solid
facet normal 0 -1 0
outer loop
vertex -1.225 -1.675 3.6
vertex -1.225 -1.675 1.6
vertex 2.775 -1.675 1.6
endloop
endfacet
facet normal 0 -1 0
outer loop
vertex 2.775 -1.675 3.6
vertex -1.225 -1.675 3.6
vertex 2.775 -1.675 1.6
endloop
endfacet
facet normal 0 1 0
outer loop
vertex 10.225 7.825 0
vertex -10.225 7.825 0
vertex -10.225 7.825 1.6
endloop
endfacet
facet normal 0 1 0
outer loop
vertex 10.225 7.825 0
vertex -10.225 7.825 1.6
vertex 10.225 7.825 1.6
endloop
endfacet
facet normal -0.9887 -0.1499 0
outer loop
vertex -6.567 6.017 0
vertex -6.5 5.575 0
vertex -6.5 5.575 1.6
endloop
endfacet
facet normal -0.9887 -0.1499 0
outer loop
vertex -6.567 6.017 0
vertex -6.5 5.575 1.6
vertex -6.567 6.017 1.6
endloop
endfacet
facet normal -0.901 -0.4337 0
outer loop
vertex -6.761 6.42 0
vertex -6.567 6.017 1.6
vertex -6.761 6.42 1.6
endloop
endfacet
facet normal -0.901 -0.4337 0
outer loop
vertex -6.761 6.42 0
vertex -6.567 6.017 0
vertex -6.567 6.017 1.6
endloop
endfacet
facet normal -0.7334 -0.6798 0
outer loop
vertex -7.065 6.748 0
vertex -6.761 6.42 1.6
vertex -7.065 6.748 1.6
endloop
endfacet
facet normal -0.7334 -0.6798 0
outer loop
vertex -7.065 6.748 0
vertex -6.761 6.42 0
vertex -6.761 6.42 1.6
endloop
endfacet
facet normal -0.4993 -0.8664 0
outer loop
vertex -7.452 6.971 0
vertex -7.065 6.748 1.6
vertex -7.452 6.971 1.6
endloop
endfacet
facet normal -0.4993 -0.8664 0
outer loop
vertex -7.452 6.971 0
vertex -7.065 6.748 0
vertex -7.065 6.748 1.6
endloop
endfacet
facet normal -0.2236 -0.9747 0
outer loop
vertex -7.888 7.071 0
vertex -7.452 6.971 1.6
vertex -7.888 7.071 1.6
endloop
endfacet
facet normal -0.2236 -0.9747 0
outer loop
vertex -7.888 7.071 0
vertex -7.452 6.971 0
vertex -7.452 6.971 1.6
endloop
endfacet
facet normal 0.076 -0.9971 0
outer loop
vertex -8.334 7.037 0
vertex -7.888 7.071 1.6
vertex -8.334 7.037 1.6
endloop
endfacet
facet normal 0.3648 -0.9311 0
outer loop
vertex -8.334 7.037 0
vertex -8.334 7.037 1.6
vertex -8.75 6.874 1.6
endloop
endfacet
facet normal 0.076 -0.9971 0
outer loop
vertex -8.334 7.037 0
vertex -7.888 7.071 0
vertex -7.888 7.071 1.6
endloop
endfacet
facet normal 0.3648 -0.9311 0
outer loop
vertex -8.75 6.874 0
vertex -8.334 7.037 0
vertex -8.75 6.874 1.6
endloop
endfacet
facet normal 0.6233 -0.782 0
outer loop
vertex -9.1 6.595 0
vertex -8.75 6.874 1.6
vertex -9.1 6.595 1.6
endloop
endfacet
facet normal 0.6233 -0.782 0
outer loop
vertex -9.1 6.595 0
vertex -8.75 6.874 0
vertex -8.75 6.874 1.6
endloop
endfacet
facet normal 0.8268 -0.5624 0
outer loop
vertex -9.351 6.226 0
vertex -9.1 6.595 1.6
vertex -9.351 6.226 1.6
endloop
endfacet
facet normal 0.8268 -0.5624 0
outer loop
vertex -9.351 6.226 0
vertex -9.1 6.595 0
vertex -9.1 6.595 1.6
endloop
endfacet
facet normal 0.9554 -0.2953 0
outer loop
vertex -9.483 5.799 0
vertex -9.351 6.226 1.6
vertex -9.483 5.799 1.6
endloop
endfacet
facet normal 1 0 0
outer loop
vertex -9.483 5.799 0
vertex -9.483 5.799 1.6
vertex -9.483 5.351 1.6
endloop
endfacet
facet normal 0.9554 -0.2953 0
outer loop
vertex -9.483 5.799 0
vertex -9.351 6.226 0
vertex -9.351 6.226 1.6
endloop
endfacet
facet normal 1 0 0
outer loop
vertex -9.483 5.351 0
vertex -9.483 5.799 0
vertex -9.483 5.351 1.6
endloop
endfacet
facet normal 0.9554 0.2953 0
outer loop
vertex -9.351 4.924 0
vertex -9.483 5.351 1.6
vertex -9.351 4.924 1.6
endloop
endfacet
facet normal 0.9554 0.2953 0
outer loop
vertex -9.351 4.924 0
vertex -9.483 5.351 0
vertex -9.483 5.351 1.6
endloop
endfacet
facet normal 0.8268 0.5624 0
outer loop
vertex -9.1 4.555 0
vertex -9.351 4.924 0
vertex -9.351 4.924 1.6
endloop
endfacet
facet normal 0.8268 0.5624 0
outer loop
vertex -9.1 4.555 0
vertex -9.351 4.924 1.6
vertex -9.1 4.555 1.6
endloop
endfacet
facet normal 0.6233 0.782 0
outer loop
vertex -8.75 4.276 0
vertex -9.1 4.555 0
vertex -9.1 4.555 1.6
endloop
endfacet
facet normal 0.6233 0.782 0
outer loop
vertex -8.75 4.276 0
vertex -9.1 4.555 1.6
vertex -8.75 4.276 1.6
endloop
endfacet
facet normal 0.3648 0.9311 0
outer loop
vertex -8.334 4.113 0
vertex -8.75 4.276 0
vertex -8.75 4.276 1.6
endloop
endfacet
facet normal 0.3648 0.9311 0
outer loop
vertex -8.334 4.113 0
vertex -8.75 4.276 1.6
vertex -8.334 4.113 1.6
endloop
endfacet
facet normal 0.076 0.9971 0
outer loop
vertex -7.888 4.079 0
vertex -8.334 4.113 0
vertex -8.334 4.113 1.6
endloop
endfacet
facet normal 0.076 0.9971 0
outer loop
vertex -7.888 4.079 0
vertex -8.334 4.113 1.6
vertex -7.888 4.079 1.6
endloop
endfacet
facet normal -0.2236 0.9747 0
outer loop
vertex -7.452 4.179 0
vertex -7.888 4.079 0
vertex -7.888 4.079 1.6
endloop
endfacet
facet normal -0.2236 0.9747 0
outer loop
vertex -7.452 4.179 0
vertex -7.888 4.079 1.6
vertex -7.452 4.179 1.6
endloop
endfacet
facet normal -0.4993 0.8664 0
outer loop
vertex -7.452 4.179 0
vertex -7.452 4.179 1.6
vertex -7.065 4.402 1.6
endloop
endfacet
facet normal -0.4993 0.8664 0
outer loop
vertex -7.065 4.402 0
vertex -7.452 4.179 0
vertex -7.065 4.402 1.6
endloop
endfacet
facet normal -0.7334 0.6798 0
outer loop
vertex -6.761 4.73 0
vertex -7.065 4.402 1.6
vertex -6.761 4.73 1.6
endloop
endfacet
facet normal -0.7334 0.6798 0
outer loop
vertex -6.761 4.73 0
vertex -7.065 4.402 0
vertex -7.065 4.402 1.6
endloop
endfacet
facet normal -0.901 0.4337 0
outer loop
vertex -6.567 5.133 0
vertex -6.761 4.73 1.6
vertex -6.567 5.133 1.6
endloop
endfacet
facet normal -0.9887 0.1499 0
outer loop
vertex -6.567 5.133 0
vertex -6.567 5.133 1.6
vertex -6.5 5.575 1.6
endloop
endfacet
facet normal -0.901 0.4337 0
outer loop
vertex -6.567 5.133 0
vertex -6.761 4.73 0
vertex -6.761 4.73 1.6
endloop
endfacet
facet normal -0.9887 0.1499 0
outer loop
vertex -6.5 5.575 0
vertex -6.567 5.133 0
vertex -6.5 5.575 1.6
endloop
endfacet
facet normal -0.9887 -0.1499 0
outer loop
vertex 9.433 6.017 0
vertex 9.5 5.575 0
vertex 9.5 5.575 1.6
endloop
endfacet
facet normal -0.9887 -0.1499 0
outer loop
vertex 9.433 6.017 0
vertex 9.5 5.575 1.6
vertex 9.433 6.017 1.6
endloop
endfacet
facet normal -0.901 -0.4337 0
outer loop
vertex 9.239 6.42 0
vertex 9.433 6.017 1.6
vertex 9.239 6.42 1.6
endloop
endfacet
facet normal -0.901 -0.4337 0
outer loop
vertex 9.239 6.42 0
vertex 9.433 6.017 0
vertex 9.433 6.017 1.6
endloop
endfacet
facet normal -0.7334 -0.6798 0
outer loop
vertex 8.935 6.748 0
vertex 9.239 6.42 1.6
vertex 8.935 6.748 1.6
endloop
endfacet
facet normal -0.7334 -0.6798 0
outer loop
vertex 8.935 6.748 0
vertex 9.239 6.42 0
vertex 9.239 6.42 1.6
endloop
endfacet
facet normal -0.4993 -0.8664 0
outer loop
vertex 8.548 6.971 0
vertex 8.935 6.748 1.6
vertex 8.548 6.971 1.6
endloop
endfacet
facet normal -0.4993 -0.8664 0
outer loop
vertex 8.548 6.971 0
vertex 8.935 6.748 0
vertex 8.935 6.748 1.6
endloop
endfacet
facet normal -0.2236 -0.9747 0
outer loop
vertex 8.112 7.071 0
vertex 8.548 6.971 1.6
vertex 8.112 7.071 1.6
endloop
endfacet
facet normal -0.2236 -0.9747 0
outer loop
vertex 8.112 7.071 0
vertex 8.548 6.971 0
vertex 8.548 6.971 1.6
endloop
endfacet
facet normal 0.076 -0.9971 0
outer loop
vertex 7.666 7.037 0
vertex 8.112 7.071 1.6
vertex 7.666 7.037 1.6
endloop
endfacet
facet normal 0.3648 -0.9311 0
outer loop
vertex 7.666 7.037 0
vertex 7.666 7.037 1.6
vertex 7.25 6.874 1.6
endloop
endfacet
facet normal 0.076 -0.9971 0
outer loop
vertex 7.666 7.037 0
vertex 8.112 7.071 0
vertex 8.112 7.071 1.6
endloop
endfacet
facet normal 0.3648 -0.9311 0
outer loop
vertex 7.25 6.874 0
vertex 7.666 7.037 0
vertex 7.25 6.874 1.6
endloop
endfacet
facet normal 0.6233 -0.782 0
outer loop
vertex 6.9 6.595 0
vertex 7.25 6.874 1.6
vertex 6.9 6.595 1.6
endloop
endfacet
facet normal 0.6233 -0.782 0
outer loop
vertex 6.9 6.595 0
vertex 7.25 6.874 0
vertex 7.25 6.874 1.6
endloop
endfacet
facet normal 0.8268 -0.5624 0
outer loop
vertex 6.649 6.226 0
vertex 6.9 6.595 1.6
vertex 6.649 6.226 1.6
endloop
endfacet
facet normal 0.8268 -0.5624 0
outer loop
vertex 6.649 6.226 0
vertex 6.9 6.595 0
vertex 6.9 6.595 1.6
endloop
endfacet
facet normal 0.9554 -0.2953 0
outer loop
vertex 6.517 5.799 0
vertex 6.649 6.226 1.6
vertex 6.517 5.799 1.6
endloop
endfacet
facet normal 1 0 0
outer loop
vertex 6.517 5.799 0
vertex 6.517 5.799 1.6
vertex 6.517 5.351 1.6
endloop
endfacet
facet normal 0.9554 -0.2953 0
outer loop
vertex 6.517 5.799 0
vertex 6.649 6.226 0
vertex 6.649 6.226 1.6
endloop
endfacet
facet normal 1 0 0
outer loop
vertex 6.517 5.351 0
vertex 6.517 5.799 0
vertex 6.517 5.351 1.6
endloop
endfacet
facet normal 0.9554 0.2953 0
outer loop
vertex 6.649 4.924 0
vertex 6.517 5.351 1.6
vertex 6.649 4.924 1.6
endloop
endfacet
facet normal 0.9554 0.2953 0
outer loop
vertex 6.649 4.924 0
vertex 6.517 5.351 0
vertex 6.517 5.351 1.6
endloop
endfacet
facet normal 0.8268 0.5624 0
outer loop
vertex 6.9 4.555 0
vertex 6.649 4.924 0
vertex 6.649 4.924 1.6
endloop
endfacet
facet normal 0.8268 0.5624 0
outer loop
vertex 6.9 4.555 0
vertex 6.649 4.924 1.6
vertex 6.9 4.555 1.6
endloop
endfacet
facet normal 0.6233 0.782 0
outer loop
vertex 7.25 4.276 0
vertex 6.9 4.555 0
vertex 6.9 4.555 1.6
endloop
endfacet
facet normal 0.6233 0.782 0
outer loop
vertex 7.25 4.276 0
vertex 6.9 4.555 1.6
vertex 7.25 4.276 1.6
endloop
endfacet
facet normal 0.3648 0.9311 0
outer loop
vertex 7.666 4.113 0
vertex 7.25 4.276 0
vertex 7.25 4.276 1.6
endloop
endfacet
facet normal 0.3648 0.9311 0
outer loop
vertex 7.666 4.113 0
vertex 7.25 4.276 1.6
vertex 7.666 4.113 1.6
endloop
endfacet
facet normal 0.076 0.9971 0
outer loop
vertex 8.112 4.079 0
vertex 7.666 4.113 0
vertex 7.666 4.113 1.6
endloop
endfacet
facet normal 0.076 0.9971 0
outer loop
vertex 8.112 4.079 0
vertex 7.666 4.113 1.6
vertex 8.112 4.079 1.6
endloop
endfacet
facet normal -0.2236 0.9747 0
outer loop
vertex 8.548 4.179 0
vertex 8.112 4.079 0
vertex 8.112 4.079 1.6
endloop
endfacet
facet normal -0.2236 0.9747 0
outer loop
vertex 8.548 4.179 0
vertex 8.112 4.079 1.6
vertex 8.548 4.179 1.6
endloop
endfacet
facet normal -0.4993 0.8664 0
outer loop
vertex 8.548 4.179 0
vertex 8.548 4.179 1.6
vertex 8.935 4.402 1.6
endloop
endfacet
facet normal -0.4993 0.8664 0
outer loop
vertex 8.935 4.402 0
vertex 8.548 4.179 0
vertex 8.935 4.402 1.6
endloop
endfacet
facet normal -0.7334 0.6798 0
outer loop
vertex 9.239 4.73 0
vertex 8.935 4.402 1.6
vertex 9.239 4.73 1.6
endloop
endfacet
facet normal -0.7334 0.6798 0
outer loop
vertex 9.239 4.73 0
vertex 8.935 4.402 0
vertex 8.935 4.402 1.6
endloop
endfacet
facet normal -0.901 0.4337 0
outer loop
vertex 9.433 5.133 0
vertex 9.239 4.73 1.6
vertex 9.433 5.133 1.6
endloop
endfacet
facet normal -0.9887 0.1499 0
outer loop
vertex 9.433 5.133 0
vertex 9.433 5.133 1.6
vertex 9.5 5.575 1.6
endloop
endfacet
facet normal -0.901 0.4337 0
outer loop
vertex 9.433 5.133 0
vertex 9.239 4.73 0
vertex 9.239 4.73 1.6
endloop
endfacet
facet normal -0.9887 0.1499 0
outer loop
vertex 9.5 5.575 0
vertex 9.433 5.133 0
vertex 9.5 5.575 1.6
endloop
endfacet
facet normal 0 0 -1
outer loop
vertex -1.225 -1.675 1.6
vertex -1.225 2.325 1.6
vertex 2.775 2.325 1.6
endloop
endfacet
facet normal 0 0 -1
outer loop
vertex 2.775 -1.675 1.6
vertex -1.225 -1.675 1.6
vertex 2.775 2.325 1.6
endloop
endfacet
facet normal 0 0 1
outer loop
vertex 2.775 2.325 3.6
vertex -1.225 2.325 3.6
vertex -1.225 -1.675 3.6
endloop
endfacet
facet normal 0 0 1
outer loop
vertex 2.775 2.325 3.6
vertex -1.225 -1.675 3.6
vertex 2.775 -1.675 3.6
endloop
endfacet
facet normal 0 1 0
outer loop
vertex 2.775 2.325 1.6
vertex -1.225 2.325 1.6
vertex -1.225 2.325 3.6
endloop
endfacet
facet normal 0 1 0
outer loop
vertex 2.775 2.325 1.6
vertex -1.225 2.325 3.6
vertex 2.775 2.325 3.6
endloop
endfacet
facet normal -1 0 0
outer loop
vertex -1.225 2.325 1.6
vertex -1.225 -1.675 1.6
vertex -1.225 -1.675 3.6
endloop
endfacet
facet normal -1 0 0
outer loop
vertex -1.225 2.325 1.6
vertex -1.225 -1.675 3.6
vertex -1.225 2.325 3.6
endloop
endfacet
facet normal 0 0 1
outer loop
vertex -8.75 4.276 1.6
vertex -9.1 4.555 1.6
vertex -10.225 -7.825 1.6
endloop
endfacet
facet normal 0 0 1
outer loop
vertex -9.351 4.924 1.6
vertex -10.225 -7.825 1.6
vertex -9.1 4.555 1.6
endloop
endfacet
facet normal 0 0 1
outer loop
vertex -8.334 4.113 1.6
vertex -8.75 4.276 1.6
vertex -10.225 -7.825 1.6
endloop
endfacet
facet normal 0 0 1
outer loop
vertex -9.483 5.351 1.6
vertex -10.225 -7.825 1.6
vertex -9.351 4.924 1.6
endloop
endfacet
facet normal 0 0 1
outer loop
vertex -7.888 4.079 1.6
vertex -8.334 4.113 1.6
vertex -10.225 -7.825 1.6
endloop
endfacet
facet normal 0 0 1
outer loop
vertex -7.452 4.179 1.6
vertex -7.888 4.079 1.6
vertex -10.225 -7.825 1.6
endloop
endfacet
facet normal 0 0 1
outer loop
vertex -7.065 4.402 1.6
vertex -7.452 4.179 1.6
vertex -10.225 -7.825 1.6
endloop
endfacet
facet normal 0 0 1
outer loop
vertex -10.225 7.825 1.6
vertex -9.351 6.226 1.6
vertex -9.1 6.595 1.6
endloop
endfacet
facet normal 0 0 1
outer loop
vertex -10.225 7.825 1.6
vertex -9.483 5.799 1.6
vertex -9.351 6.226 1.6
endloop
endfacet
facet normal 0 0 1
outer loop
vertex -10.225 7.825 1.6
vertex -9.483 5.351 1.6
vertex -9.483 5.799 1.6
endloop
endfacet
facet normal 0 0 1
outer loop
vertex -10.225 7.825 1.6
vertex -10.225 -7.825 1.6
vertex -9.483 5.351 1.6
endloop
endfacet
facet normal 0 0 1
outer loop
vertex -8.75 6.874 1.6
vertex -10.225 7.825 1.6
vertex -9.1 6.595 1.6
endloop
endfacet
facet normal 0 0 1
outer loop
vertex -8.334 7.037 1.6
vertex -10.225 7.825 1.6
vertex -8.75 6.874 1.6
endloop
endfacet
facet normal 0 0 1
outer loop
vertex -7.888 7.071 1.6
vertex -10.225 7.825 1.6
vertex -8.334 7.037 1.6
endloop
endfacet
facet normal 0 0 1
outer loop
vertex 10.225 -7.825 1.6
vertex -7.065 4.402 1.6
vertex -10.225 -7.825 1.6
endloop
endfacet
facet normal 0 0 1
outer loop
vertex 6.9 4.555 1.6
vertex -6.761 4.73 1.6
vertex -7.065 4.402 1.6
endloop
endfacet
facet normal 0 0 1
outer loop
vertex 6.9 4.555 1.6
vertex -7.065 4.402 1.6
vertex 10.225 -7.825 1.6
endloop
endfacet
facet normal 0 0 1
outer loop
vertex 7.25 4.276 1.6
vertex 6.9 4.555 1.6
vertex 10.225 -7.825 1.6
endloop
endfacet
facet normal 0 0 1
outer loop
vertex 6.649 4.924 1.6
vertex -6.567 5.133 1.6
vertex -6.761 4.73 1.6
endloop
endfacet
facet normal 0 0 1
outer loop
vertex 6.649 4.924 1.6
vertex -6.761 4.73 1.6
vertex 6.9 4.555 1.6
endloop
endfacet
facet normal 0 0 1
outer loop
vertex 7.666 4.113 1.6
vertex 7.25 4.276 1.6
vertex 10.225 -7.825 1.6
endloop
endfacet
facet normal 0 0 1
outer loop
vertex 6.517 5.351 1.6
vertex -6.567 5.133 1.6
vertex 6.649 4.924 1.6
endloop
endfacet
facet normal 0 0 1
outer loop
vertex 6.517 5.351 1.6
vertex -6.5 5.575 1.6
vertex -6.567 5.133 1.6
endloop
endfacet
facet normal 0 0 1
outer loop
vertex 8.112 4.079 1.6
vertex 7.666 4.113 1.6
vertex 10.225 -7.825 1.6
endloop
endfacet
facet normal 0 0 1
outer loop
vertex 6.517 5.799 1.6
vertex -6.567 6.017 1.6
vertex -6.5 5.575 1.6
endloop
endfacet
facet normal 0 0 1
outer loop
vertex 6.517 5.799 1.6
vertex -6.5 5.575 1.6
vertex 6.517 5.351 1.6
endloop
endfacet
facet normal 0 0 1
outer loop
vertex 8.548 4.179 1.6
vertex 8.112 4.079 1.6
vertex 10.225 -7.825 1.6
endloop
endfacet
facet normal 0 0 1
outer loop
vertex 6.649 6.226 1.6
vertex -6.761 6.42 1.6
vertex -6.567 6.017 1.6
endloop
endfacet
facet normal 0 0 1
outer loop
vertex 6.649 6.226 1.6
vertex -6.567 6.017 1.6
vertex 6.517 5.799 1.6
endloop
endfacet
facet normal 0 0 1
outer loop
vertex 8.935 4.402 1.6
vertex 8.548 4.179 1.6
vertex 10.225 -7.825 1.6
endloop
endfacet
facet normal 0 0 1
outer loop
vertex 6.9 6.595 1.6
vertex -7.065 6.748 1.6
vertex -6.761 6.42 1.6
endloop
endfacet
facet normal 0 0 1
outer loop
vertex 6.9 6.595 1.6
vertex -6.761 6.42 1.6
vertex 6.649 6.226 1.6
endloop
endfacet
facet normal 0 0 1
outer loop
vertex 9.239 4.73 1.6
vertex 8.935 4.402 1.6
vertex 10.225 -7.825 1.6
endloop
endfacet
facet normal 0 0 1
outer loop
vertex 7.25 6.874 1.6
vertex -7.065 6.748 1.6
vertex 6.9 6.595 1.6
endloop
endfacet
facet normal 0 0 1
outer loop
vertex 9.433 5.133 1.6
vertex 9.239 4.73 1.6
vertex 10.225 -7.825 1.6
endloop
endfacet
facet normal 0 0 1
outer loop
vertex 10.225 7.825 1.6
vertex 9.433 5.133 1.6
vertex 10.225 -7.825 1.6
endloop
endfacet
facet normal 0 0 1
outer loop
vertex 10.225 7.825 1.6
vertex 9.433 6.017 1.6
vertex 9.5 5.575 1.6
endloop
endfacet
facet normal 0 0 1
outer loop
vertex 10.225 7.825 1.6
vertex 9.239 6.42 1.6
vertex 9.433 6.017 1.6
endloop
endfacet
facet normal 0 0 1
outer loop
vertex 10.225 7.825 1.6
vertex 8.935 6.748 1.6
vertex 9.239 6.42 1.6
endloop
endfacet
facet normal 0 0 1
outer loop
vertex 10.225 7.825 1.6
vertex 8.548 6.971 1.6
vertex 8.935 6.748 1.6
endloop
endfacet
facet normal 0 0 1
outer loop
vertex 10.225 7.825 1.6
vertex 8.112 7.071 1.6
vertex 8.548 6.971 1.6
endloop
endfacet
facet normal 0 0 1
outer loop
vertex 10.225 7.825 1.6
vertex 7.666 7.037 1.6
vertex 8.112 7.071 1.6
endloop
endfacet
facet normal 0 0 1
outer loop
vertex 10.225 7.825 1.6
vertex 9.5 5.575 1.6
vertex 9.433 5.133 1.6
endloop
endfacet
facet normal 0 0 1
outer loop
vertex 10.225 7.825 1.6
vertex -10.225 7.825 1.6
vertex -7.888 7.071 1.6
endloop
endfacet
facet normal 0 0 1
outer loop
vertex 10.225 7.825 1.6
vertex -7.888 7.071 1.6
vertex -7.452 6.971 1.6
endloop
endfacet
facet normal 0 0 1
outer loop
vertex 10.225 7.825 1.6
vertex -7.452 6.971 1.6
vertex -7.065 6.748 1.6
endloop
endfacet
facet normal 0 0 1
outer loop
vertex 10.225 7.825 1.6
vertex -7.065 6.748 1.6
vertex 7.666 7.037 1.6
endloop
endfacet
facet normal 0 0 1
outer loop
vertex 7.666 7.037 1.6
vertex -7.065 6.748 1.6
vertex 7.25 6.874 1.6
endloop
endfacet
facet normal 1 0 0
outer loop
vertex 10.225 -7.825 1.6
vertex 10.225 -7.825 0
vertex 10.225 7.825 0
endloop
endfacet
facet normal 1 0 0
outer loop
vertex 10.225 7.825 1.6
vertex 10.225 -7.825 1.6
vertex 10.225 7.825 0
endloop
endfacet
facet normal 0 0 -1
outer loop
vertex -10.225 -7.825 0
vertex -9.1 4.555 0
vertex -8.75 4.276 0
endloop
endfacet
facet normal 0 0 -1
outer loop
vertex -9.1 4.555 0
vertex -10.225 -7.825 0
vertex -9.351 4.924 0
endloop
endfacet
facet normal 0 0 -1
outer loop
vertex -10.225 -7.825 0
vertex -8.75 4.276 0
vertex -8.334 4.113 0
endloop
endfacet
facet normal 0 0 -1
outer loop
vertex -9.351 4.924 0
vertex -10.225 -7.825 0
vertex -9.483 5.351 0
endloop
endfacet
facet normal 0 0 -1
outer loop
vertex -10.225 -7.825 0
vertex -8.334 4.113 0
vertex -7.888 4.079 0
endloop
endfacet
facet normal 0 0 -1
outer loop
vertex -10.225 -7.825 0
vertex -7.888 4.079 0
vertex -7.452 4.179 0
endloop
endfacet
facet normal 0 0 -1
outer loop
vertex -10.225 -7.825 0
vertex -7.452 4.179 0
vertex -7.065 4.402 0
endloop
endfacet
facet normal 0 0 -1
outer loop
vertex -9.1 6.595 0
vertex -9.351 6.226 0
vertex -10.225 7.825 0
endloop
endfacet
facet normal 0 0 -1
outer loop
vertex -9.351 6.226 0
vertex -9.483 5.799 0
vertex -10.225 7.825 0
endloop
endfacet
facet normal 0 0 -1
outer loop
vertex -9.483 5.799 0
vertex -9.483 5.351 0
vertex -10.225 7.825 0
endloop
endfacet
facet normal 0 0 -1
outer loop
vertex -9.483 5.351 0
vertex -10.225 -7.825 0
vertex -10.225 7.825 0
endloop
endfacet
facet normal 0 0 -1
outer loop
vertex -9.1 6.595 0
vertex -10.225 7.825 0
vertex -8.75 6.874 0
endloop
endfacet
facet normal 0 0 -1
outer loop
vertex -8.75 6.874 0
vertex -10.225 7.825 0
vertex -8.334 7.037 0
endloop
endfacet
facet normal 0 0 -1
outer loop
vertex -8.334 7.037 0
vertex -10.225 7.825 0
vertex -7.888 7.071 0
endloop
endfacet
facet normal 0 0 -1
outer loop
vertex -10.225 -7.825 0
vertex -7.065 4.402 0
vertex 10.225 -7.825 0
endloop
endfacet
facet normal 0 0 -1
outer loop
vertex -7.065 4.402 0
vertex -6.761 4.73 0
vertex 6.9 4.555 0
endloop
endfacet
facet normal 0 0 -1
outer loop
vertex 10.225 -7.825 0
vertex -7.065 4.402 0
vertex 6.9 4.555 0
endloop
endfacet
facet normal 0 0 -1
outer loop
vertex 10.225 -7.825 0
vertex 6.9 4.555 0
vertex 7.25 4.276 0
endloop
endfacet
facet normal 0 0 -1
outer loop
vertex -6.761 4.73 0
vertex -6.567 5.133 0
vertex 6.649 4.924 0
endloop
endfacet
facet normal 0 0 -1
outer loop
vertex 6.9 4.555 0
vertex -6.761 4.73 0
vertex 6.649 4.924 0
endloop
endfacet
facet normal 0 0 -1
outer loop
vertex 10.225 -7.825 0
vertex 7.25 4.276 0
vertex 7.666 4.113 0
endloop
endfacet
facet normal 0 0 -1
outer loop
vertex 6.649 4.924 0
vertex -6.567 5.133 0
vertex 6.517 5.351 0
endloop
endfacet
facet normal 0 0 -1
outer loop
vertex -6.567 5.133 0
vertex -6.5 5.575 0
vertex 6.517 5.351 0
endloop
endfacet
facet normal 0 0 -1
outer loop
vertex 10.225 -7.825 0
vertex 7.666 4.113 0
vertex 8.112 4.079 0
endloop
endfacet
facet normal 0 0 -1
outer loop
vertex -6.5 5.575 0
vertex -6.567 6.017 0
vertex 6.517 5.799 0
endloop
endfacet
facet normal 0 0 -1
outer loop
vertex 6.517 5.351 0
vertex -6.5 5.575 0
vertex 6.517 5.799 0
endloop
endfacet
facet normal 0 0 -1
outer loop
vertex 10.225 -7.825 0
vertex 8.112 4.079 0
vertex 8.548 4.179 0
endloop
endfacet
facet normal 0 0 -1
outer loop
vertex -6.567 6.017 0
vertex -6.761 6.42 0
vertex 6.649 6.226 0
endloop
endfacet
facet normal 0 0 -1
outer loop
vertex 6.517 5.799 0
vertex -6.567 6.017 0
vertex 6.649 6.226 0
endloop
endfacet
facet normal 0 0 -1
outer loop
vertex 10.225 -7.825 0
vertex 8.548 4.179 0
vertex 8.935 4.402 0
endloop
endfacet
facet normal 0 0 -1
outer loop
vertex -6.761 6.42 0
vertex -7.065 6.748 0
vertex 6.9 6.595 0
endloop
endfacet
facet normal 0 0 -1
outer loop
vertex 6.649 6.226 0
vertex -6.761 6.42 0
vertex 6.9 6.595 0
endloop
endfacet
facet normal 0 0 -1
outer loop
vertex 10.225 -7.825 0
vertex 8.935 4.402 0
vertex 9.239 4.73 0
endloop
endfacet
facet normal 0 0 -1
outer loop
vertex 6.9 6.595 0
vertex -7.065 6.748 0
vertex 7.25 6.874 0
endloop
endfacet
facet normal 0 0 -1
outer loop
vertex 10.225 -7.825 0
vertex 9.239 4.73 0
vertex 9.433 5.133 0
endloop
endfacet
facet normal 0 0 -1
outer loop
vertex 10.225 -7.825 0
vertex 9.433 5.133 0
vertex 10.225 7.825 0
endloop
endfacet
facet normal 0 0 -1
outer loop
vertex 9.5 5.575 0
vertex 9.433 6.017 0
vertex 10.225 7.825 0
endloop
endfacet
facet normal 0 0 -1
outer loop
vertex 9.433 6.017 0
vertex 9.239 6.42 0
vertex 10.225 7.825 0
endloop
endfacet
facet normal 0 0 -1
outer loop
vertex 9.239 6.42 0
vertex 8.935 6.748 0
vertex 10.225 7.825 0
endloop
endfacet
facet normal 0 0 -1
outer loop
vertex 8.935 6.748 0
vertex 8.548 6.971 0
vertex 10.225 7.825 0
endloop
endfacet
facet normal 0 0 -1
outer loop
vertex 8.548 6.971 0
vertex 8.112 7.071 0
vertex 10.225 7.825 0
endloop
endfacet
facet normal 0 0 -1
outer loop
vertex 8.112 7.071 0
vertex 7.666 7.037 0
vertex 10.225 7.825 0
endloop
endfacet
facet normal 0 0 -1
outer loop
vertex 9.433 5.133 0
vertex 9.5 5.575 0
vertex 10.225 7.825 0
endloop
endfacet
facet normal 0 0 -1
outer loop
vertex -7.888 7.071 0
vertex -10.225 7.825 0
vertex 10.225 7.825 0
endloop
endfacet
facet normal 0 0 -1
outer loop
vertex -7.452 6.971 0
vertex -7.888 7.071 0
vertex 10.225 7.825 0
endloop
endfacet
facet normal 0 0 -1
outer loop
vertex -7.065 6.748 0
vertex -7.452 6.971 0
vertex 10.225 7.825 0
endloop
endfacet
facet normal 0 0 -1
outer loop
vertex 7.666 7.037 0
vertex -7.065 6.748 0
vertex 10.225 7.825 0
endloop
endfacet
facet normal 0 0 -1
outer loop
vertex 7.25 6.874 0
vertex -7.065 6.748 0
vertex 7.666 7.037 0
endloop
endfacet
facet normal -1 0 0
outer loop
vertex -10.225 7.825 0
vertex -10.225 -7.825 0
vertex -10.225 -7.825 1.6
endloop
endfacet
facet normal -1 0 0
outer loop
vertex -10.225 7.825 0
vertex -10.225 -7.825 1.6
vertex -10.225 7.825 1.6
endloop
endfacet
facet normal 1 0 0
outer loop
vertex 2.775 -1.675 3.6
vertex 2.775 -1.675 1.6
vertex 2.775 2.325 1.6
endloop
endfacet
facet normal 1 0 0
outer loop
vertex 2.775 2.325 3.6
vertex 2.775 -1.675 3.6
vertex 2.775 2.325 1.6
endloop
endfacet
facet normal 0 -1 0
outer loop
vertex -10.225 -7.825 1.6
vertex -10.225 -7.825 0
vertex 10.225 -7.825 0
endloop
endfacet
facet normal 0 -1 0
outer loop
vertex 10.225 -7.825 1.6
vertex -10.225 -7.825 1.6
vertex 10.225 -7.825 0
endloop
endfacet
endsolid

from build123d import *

# Parameters (mm, degrees)
SKICA1_W                = 20.45
SKICA1_H                = 15.65
SKICA1_R                = 1.5
P_IDAT_VYSUNUT_M1_DEPTH = 1.6
SKICA2_W                = 4
SKICA2_H                = 4
P_IDAT_VYSUNUT_M2_DEPTH = 2


with BuildPart() as part:
    # Skica1 → Přidat vysunutím1 (new body)
    with BuildSketch(Plane.XY):
        Rectangle(SKICA1_W, SKICA1_H)
        with Locations((-8, 5.575)):
            Circle(SKICA1_R, mode=Mode.SUBTRACT)
        with Locations((8, 5.575)):
            Circle(SKICA1_R, mode=Mode.SUBTRACT)
    extrude(amount=P_IDAT_VYSUNUT_M1_DEPTH)


with BuildPart() as body_2:
    # Skica2 → Přidat vysunutím2 (new body)
    with BuildSketch(Plane.XY.offset(1.6)):
        with Locations((0.775, 0.325)):
            Rectangle(SKICA2_W, SKICA2_H)
    extrude(amount=P_IDAT_VYSUNUT_M2_DEPTH)


solid = Compound([part.part, body_2.part])
